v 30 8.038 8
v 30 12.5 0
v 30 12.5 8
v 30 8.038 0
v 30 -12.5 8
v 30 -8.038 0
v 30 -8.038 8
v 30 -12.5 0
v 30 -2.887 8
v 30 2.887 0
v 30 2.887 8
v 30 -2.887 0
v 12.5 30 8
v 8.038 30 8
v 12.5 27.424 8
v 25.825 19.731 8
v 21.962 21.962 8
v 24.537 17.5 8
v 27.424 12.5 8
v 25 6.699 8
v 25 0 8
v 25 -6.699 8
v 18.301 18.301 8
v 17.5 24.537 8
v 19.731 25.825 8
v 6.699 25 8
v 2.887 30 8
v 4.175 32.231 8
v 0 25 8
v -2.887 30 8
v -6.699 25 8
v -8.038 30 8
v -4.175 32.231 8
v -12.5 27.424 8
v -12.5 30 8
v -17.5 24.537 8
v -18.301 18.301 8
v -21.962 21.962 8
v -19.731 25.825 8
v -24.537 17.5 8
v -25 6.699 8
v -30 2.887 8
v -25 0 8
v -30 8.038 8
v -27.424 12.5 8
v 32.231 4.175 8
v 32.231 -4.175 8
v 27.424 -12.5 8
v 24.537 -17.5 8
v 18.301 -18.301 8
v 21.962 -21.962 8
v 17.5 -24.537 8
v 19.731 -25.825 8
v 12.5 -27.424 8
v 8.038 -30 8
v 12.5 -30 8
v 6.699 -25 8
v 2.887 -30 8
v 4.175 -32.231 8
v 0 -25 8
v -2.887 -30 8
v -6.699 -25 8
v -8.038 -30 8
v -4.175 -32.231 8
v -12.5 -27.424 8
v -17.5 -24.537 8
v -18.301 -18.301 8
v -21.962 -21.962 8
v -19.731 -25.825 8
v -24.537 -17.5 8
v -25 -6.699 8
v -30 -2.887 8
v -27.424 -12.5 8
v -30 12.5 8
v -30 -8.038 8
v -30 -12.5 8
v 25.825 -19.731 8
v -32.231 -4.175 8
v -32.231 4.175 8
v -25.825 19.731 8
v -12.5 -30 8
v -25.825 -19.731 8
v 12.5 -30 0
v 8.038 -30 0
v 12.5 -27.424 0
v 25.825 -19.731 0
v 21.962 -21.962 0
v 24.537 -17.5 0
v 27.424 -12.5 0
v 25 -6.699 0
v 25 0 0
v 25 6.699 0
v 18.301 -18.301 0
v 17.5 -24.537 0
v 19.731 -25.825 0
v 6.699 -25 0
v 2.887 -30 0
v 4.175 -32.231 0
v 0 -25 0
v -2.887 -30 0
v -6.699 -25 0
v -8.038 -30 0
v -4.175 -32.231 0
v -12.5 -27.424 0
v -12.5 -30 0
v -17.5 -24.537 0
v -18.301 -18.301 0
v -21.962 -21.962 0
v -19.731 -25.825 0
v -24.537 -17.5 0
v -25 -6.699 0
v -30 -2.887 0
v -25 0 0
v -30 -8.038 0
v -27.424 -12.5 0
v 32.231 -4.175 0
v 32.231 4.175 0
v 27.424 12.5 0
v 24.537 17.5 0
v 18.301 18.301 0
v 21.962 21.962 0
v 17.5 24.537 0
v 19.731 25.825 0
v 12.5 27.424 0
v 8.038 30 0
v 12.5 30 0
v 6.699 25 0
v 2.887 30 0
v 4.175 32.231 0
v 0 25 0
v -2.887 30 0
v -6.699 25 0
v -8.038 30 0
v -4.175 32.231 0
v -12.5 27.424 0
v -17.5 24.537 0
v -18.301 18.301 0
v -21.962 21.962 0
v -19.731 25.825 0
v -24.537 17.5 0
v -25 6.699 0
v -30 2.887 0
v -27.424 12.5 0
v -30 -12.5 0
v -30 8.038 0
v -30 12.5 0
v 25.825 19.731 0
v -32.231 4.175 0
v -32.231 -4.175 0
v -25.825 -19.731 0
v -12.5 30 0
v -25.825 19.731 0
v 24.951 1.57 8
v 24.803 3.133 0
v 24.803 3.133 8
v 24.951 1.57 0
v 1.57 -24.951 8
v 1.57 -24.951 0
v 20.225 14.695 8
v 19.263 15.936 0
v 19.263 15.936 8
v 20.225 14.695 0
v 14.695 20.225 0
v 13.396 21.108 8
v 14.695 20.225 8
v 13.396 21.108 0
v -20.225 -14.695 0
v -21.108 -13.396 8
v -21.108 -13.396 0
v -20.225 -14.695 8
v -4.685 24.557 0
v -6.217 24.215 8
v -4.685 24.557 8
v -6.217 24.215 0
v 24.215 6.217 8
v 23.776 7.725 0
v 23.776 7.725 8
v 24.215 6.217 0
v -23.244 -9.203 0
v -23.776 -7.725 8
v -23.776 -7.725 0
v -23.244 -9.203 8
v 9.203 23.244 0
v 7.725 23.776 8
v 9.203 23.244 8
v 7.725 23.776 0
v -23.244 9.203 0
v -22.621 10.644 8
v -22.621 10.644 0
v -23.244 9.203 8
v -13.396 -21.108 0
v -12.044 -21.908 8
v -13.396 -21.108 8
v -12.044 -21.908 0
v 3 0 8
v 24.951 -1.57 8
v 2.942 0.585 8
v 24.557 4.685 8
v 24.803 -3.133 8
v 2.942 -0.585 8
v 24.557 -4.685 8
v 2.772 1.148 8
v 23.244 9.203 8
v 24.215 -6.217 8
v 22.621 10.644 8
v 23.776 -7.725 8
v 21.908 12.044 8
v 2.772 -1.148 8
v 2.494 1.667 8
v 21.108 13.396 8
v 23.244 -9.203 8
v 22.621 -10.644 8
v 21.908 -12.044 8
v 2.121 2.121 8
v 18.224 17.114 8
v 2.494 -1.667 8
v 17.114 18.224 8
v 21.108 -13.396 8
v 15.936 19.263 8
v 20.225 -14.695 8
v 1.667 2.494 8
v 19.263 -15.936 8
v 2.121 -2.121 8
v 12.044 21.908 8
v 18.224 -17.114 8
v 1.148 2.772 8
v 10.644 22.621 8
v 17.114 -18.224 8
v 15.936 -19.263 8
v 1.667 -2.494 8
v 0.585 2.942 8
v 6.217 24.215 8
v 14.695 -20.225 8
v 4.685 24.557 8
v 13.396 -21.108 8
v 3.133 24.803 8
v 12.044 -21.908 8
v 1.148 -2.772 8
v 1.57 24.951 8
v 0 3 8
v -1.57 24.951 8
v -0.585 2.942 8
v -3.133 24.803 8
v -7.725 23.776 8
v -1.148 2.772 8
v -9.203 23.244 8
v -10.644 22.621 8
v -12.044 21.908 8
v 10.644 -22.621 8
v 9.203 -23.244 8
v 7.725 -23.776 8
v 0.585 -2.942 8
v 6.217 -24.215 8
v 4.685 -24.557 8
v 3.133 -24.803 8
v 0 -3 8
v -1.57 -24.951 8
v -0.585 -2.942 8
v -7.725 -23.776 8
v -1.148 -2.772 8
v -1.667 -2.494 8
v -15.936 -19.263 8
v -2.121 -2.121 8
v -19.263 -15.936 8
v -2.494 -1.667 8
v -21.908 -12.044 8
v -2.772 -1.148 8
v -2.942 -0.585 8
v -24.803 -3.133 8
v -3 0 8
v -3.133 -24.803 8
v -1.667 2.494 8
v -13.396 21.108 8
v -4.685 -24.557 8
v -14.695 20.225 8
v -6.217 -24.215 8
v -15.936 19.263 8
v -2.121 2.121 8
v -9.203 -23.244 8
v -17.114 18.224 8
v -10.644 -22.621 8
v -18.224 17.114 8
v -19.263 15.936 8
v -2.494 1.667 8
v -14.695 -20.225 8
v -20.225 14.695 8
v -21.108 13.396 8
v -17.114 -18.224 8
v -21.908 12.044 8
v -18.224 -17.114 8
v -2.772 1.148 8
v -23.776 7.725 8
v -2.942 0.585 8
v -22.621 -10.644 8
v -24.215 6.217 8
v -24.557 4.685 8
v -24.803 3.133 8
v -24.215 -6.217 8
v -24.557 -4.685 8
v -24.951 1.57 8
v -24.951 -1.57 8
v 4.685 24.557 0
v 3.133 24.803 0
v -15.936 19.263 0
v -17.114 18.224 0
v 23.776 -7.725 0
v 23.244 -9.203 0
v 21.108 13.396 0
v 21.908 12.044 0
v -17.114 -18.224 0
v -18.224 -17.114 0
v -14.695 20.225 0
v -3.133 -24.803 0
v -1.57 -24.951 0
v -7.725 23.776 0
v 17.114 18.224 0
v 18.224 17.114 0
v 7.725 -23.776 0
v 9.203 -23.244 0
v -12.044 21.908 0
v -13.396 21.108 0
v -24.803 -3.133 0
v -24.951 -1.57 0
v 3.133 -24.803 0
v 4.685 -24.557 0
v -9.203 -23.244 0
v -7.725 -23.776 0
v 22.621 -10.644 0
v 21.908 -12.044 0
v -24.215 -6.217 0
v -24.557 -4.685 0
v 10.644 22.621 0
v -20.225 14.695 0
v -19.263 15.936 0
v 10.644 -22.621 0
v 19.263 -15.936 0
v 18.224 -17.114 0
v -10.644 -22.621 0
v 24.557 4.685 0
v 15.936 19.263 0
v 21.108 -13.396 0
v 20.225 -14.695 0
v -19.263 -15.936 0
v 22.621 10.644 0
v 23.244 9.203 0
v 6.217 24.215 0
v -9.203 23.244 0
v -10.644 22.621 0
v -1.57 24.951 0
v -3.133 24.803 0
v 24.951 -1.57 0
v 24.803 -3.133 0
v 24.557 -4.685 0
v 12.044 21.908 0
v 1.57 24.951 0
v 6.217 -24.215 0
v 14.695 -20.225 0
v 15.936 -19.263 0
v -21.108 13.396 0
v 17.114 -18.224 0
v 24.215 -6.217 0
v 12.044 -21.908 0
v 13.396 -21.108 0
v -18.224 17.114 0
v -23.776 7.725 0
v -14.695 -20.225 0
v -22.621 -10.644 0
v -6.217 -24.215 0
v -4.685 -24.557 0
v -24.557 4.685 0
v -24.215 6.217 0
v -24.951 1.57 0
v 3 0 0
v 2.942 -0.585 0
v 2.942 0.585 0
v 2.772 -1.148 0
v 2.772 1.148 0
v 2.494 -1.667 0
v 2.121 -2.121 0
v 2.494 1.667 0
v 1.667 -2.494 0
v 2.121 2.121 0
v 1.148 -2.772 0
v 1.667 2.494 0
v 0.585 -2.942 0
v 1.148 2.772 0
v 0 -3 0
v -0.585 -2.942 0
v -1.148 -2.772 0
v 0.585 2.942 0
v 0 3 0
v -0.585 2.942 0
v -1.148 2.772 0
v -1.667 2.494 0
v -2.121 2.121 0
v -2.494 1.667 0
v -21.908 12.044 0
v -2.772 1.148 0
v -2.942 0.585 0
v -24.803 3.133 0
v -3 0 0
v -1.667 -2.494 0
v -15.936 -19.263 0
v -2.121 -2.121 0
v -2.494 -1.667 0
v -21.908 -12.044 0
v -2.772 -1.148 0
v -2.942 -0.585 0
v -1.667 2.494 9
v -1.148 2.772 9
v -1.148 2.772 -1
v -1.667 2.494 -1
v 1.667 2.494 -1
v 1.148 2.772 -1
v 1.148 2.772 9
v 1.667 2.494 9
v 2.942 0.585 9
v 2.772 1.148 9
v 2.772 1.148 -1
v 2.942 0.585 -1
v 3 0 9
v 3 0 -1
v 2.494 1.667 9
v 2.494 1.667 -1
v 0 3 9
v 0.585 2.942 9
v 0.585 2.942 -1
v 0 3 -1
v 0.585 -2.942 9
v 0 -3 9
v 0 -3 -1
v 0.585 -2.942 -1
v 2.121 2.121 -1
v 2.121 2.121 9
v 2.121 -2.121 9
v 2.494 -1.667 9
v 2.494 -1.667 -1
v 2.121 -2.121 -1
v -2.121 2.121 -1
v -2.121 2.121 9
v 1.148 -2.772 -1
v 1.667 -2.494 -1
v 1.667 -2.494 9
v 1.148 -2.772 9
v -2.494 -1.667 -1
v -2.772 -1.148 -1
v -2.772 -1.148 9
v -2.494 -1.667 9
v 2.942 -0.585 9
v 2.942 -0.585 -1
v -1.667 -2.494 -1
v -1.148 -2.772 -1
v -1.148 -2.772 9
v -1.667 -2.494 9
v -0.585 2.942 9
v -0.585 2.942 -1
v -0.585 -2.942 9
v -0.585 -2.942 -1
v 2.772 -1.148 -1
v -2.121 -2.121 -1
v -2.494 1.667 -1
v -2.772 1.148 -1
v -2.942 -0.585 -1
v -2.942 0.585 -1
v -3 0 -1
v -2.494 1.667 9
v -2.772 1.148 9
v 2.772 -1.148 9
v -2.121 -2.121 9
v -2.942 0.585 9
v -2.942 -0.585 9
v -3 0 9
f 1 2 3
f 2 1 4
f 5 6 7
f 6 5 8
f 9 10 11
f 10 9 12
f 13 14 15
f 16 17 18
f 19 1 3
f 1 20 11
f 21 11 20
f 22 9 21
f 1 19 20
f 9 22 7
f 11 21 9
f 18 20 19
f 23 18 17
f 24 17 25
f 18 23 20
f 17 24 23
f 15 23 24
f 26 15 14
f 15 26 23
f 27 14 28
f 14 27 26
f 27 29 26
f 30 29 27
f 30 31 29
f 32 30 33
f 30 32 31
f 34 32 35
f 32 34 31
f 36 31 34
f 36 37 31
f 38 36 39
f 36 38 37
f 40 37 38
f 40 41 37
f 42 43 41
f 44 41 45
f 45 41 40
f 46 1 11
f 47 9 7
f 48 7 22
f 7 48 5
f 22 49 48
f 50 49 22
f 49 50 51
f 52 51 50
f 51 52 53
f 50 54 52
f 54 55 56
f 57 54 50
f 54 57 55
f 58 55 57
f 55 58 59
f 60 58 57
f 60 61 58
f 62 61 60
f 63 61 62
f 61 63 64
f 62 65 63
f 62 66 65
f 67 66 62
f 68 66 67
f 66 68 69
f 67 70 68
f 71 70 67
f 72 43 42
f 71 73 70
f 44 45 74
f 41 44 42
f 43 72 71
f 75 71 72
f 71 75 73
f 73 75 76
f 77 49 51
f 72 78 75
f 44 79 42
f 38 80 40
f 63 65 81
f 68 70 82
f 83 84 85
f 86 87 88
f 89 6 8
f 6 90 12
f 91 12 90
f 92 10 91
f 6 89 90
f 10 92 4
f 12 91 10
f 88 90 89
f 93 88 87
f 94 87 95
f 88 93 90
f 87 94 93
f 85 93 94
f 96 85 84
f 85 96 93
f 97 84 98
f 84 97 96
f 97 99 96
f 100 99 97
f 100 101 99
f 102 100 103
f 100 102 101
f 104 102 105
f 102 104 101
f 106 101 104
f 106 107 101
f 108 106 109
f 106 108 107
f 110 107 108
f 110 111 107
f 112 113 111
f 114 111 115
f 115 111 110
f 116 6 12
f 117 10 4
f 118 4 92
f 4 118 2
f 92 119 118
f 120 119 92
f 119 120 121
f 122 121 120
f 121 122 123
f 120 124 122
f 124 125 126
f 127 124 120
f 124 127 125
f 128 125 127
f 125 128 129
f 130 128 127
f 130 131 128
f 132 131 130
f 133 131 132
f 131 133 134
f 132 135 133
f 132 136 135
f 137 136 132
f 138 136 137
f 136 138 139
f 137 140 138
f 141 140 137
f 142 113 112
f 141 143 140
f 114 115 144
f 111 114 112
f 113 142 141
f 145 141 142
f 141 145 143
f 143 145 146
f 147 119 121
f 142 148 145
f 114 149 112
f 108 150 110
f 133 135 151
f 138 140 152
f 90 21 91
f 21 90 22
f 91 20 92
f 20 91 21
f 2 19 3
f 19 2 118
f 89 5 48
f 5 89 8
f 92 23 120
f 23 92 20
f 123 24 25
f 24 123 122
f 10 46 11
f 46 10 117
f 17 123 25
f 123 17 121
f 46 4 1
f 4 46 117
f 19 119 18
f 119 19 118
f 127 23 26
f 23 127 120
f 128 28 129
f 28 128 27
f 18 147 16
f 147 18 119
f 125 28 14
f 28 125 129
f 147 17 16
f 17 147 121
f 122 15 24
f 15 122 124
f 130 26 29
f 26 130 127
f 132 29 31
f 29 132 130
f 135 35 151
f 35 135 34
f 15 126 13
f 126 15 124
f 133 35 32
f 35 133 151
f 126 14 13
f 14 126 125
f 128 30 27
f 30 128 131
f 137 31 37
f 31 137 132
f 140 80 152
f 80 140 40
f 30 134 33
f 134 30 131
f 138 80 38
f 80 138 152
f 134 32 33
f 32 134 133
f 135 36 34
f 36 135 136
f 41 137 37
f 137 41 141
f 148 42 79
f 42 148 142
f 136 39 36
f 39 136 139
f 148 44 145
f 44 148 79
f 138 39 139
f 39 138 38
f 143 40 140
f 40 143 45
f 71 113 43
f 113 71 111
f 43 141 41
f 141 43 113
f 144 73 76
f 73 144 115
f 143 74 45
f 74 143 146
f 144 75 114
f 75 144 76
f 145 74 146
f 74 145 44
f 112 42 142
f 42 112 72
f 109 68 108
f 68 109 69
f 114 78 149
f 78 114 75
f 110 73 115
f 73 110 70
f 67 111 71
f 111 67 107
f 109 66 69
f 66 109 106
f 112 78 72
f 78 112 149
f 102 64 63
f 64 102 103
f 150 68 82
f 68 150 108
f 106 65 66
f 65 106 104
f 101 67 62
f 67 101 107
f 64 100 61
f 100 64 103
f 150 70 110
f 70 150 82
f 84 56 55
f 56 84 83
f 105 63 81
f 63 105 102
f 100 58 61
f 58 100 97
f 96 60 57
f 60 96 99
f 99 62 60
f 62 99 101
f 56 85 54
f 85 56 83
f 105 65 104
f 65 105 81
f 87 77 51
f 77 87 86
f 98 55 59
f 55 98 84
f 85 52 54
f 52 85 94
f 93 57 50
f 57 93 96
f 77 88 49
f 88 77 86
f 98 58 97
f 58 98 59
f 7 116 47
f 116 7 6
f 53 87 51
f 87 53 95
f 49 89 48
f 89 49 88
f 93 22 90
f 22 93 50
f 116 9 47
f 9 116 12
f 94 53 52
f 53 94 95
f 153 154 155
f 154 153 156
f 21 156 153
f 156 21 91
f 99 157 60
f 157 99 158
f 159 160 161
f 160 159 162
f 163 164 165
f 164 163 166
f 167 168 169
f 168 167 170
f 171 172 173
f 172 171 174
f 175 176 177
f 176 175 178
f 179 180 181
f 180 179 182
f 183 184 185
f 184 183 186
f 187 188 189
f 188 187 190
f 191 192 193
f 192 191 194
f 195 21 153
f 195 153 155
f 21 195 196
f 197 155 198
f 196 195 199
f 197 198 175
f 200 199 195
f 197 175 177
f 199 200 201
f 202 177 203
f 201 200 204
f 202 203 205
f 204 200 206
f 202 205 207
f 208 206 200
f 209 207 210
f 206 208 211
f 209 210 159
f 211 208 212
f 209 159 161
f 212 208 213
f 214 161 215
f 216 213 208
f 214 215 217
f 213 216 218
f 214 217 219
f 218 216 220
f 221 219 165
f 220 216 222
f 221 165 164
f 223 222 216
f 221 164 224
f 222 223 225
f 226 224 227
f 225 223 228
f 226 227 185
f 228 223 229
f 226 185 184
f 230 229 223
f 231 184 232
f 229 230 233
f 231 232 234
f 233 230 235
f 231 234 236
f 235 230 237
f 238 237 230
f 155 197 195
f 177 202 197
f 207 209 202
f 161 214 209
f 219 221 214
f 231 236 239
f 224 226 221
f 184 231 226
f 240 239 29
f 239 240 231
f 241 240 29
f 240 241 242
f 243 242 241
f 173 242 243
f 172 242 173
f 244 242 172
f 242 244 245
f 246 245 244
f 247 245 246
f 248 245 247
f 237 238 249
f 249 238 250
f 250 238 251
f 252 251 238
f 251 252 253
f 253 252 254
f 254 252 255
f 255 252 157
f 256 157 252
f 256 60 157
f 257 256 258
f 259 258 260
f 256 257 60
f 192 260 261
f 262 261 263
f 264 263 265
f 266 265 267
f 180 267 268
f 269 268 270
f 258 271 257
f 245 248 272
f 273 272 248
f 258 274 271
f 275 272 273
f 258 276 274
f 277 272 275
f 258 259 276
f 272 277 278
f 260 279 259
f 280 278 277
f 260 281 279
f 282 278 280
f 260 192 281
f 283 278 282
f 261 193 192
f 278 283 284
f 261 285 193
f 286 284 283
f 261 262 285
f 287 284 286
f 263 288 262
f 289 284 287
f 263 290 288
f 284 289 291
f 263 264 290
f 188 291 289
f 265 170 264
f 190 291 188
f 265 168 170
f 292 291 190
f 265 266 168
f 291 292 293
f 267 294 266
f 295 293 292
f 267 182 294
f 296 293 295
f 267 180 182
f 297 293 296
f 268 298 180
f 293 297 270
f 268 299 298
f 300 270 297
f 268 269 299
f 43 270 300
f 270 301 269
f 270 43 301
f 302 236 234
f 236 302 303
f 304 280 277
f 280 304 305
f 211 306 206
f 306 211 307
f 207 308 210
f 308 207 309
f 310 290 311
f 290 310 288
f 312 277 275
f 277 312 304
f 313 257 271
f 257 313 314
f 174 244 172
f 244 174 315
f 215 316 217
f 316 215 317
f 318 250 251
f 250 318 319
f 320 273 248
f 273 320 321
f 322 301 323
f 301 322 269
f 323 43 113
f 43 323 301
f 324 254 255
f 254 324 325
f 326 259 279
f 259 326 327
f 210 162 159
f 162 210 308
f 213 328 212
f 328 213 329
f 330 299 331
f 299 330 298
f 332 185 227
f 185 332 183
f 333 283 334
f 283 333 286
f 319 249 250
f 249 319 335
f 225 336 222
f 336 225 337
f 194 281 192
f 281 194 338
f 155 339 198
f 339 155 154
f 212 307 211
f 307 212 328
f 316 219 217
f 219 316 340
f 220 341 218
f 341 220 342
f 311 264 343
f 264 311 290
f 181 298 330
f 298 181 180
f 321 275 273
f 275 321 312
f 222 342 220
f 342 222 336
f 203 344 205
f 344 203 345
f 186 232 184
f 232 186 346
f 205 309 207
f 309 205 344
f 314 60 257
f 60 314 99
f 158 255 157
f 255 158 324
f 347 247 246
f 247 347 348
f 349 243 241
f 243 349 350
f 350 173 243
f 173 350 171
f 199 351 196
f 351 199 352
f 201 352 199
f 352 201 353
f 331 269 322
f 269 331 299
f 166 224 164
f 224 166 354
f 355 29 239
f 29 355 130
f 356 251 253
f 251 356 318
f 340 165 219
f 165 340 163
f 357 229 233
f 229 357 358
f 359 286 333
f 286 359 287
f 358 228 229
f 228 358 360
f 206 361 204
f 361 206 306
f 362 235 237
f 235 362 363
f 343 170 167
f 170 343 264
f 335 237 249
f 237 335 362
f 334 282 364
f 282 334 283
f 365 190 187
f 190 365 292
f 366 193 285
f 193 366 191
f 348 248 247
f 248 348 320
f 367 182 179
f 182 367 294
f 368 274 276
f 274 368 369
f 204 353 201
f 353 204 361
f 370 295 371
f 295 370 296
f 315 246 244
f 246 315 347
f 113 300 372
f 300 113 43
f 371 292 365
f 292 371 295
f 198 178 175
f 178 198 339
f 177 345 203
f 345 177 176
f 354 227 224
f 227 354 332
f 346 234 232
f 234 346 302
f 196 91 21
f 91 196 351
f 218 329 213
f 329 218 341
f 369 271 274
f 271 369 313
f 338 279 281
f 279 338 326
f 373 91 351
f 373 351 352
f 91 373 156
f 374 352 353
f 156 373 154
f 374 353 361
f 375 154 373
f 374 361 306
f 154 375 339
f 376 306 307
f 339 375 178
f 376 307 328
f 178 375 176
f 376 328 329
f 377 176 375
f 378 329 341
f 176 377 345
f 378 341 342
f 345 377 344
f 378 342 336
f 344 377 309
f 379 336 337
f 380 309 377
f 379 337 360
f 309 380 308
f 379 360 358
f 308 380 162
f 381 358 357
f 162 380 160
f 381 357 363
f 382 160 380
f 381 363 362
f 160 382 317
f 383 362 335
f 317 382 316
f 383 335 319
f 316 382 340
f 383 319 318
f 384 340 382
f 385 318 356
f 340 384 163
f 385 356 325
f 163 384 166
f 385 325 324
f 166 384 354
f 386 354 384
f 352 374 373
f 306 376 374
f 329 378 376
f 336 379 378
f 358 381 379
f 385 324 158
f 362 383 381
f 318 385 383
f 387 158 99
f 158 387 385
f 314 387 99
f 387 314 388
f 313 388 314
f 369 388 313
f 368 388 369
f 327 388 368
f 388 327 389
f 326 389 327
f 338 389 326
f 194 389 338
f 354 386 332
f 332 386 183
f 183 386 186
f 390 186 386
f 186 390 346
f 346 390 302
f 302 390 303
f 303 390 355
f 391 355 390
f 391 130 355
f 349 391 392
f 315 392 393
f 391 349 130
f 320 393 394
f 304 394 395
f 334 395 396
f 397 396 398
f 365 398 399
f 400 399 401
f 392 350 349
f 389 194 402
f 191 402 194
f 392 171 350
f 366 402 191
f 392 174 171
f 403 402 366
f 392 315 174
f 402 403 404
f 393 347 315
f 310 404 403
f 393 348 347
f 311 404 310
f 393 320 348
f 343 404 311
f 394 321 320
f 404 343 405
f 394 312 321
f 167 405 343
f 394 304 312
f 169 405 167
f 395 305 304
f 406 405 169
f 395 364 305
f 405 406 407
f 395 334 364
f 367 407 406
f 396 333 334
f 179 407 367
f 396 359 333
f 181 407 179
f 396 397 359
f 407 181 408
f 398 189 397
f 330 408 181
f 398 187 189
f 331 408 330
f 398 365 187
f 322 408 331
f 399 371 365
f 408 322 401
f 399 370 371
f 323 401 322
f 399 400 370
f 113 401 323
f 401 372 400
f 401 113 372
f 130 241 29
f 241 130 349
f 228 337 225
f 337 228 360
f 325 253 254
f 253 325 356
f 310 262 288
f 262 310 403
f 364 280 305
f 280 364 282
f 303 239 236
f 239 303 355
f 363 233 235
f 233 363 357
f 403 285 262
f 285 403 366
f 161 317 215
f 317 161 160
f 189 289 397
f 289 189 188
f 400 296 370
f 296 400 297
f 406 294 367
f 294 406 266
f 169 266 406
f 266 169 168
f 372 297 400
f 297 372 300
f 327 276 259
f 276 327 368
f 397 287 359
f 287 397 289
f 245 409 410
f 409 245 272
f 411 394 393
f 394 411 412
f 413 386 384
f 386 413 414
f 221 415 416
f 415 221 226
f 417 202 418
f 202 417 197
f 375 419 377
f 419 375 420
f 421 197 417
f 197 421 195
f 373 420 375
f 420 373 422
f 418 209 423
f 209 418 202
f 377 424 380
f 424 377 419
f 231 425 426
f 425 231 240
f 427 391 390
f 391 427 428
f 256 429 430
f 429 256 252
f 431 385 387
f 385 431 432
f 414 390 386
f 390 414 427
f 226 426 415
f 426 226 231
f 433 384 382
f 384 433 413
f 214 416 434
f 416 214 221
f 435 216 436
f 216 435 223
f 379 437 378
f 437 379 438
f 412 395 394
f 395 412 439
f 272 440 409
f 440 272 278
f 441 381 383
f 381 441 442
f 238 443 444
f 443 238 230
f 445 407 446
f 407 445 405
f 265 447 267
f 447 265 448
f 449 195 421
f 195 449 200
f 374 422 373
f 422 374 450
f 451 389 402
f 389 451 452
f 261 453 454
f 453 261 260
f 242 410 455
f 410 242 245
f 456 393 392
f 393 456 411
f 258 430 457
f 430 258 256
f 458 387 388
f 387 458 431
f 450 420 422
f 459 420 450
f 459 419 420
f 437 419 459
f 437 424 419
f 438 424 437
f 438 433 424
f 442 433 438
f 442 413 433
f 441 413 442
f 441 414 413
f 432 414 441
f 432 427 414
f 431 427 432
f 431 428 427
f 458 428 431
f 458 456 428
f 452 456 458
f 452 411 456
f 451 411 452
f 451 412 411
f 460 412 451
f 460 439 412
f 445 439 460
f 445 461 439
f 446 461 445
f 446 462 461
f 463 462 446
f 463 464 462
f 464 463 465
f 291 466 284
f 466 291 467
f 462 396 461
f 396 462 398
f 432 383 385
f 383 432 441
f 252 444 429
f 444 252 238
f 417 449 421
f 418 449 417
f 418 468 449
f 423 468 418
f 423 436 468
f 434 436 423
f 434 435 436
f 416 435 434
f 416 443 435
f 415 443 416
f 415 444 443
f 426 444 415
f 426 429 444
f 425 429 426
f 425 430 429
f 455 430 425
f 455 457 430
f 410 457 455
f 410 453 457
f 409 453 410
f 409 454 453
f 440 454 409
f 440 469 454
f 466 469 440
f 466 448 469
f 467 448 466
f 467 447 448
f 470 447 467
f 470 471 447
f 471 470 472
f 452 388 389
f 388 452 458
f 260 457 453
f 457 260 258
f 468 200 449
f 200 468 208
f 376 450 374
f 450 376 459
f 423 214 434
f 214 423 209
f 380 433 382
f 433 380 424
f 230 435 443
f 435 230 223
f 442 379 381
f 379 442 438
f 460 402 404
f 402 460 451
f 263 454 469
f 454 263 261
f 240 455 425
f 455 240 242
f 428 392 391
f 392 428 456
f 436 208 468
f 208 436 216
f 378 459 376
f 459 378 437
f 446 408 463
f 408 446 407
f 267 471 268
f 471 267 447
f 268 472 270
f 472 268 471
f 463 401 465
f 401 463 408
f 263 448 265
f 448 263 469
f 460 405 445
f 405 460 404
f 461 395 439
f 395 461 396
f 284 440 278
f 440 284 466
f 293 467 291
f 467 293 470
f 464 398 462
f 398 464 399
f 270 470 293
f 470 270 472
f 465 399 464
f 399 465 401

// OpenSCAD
// file: config.scad
// --- Robot Dimensions ---
track_width = 50;        // mm
sprocket_diameter = 50;  // mm
motor_length = 54;       // mm
motor_shaft = 6;         // D-shaft diameter
motor_mount_hole = 3;    // M3
battery_length = 75;     // mm
battery_width  = 55;     // mm
battery_height = 20;     // mm
jetson_plate_length = 120; // mm
jetson_plate_width  = 100; // mm
chassis_thickness = 5;      // mm
// main file
include <config.scad>;

module drive_sprocket(teeth_count = 12, thickness = 8) {
    radius = sprocket_diameter / 2;
    
    // Base cylinder
    cylinder(h = thickness, r = radius, $fn = 100);

    // Teeth (simple rectangular for LEGO-style)
    for(i = [0 : teeth_count-1]) {
        angle = 360/teeth_count * i;
        rotate([0,0,angle])
            translate([radius, -track_width/4, 0])
                cube([5, track_width/2, thickness]);
    }

    // Hole for motor D-shaft
    translate([0,0,-1])
        cylinder(h = thickness+2, r = motor_shaft/2, $fn=32);
}

drive_sprocket();
